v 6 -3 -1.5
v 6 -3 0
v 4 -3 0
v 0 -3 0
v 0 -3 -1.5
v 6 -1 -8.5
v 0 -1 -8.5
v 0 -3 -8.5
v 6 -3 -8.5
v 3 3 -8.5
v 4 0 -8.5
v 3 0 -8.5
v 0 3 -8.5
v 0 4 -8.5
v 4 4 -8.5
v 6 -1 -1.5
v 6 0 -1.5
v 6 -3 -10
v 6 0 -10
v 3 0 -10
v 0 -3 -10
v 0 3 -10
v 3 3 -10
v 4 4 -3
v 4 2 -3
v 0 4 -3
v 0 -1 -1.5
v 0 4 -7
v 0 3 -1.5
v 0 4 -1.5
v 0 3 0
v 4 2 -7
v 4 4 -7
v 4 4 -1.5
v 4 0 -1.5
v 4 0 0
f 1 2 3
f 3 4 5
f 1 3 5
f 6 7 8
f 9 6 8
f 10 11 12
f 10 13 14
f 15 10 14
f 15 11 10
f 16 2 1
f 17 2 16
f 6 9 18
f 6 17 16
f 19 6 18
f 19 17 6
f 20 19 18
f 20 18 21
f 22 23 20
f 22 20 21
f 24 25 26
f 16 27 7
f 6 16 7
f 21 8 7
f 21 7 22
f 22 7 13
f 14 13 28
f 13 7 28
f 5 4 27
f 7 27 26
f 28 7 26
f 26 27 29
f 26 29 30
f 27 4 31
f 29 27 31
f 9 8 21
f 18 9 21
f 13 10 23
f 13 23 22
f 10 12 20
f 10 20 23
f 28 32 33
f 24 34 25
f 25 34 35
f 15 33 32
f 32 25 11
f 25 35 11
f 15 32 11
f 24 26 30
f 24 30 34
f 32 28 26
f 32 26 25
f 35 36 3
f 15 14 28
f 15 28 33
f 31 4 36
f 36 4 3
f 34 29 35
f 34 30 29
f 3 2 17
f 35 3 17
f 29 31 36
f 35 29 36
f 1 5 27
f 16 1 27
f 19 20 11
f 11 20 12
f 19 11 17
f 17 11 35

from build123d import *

# Parameters (mm, degrees)
SALIENTE_EXTRUIR2_DEPTH = 6
CORTAR_EXTRUIR2_DEPTH   = 2
CROQUIS6_W              = 4
CROQUIS6_H              = 8
SALIENTE_EXTRUIR3_DEPTH = 4
CORTAR_EXTRUIR3_DEPTH   = 1.5
CROQUIS9_W              = 4
CROQUIS9_H              = 2
CORTAR_EXTRUIR4_DEPTH   = 5
CROQUIS10_W             = 1.5
CROQUIS10_H             = 4
SALIENTE_EXTRUIR4_DEPTH = 4
SALIENTE_EXTRUIR5_DEPTH = 4
CROQUIS13_W             = 3
CROQUIS13_H             = 3
SALIENTE_EXTRUIR6_DEPTH = 1.5


with BuildPart() as part:
    # Croquis2 → Saliente-Extruir2 (new body)
    with BuildSketch(Plane(origin=(0, 0, 0), x_dir=(0, 0, -1), z_dir=(1, 0, 0))):
        Polygon((0, 0), (0, -3), (1.5, -3), (1.5, -1), (8.5, -1), (8.5, -3), (10, -3), (10, 0), align=None)
    extrude(amount=SALIENTE_EXTRUIR2_DEPTH)

    # Croquis5 → Cortar-Extruir2 (cut)
    with BuildSketch(Plane(origin=(6, 0, 0), x_dir=(0, 0, -1), z_dir=(1, 0, 0))):
        Polygon((0, -3), (1.5, 0), (0, 0), align=None)
    extrude(amount=-CORTAR_EXTRUIR2_DEPTH, mode=Mode.SUBTRACT)

    # Croquis6 → Saliente-Extruir3 (add)
    with BuildSketch(Plane(origin=(0, 0, 0), x_dir=(1, 0, 0), z_dir=(0, 1, 0))):
        with Locations((2, 4)):
            Rectangle(CROQUIS6_W, CROQUIS6_H)
    extrude(amount=SALIENTE_EXTRUIR3_DEPTH)

    # Croquis7 → Cortar-Extruir3 (cut)
    with BuildSketch(Plane.XY):
        Polygon((0, 3), (4, 0), (4, 4), (0, 4), align=None)
    extrude(amount=-CORTAR_EXTRUIR3_DEPTH, mode=Mode.SUBTRACT)

    # Croquis9 → Cortar-Extruir4 (cut)
    with BuildSketch(Plane(origin=(4, 0, 0), x_dir=(0, 0, -1), z_dir=(1, 0, 0))):
        with Locations((5, 3)):
            Rectangle(CROQUIS9_W, CROQUIS9_H)
    extrude(amount=-CORTAR_EXTRUIR4_DEPTH, mode=Mode.SUBTRACT)

    # Croquis10 → Saliente-Extruir4 (add)
    with BuildSketch(Plane(origin=(4, 0, 0), x_dir=(0, 0, -1), z_dir=(1, 0, 0))):
        with Locations((7.75, 2)):
            Rectangle(CROQUIS10_W, CROQUIS10_H)
    extrude(amount=-SALIENTE_EXTRUIR4_DEPTH)

    # Croquis12 → Saliente-Extruir5 (add)
    with BuildSketch(Plane.XY.offset(-7)):
        Polygon((0, 4), (4, 2), (0, 2), align=None)
    extrude(amount=SALIENTE_EXTRUIR5_DEPTH)

    # Croquis13 → Saliente-Extruir6 (add)
    with BuildSketch(Plane(origin=(0, 0, -8.5), x_dir=(-1, 0, 0), z_dir=(0, 0, -1))):
        with Locations((-1.5, 1.5)):
            Rectangle(CROQUIS13_W, CROQUIS13_H)
    extrude(amount=SALIENTE_EXTRUIR6_DEPTH)


solid = part.part
